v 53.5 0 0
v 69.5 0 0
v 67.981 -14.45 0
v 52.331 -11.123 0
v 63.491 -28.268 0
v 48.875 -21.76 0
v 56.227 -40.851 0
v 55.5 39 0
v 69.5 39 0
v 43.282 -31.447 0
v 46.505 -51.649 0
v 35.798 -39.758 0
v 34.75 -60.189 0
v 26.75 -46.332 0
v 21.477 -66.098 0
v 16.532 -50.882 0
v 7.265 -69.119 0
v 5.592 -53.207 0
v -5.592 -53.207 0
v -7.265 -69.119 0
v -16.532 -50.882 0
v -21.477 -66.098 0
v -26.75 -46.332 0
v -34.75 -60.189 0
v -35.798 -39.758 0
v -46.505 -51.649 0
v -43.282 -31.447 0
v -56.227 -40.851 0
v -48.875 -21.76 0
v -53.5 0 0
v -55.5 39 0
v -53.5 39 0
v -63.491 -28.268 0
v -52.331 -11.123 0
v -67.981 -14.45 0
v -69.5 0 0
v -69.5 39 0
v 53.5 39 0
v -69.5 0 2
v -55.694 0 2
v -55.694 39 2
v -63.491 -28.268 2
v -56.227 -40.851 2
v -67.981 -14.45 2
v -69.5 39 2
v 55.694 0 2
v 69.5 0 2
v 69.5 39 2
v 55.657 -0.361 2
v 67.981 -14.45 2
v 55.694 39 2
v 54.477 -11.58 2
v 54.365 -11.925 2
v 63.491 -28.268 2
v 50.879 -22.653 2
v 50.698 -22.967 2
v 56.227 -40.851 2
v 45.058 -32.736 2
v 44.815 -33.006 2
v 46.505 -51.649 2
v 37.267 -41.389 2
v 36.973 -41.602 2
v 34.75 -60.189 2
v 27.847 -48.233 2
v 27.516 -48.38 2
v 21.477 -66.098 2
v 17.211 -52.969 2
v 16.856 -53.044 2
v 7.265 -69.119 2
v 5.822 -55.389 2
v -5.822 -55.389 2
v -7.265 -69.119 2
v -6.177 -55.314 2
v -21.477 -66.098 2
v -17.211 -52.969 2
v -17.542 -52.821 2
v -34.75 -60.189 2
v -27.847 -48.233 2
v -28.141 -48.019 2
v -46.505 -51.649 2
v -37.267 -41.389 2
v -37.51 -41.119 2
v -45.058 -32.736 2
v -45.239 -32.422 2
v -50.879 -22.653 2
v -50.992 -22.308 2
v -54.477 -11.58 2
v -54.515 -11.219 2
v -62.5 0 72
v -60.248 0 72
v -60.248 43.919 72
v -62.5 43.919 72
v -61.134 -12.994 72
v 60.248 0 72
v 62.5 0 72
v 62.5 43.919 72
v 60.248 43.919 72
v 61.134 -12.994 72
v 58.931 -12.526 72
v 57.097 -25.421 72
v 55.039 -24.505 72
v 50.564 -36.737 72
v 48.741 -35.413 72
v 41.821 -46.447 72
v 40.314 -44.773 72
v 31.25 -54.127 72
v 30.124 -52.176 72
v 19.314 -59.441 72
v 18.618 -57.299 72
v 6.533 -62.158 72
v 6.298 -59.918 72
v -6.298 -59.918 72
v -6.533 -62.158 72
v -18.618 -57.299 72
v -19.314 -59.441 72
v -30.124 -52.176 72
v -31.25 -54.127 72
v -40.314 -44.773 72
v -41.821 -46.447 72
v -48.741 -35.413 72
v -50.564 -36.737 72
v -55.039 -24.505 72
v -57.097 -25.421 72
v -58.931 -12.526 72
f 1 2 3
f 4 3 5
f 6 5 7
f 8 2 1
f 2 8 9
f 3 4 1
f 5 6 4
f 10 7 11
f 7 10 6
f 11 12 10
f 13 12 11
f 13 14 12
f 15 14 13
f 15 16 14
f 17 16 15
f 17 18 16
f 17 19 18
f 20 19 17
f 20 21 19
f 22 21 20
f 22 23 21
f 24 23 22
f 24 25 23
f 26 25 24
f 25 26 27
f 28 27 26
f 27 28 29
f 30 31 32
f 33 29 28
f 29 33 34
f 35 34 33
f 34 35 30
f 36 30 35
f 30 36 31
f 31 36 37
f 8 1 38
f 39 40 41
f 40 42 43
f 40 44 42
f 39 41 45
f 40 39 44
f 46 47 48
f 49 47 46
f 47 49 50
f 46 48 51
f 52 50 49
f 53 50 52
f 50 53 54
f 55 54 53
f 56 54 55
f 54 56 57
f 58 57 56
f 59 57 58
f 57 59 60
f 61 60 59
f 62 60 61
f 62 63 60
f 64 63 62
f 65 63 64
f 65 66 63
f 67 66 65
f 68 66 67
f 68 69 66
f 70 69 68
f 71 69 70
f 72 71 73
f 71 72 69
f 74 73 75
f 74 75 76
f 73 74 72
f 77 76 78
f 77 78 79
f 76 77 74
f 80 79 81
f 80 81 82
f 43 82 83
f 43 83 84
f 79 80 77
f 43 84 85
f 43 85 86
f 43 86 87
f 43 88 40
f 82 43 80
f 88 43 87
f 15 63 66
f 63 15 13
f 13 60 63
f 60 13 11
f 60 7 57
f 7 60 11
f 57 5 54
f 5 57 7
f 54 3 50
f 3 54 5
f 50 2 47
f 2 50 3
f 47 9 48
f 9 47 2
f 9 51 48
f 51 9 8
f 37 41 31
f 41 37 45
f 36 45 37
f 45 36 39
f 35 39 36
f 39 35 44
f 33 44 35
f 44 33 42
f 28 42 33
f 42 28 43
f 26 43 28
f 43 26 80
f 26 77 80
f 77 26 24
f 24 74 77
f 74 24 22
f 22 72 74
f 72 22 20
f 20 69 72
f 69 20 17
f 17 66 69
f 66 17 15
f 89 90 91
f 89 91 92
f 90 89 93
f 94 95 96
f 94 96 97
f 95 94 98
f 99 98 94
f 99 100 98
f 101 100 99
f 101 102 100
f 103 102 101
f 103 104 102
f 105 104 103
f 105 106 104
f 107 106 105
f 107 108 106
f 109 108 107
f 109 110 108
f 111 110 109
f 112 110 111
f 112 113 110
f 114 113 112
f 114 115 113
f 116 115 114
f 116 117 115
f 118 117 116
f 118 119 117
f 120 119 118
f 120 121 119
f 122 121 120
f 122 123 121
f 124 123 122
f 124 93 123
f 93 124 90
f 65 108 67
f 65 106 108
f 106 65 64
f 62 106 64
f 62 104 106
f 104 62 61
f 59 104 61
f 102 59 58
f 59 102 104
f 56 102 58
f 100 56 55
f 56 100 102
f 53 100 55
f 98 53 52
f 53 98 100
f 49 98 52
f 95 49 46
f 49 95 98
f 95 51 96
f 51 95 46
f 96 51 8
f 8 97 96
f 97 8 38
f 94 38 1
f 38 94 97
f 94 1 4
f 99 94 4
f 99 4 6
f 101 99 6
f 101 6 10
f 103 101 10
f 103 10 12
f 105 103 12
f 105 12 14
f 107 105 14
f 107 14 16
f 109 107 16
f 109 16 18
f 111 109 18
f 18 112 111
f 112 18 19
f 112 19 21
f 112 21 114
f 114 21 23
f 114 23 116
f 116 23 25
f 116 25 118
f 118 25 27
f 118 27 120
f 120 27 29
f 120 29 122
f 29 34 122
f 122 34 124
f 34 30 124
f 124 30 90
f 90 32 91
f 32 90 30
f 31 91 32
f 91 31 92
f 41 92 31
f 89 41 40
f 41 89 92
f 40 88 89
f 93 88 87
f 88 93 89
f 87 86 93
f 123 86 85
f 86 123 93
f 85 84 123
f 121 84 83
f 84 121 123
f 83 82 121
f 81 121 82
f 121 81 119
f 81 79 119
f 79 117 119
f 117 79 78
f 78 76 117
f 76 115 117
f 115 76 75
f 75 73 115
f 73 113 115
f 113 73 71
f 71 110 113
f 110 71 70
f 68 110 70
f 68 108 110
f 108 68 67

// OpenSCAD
wallThickness = 2;
flangeWidth = 14;
depth = 72;
upperDiameter = 111;
extensionLength = 39;
bottomSetback = 14;

module upperOutline(outerDiameter, innerDiameter) {
    difference() {
        union() {
            circle(d = outerDiameter);
            translate([0,extensionLength/2,0])
                square([outerDiameter,extensionLength], center = true);
        }
        union() {
            circle(d = innerDiameter);
            translate([0,2*extensionLength/2,0])
                square([innerDiameter,2*extensionLength], center = true);
        }
    }
}

module flange() {
    difference() {
        translate([0,0,wallThickness/2])
            linear_extrude(height = wallThickness, center = true)
                upperOutline(upperDiameter + 2*flangeWidth,
                    upperDiameter - wallThickness);
        // Not clear to me why the translate is so fudgy
        translate([0, extensionLength+flangeWidth+5.5, wallThickness-0.1])
            cube([upperDiameter + 2*flangeWidth+0.1, extensionLength, wallThickness*2], center = true);
    }
}

ratio = (upperDiameter+bottomSetback)/upperDiameter;
translate([0,0,depth/2])
    linear_extrude(height = depth, center = true, 
        scale = ratio)
        upperOutline(upperDiameter,upperDiameter-2*wallThickness);
flange();
